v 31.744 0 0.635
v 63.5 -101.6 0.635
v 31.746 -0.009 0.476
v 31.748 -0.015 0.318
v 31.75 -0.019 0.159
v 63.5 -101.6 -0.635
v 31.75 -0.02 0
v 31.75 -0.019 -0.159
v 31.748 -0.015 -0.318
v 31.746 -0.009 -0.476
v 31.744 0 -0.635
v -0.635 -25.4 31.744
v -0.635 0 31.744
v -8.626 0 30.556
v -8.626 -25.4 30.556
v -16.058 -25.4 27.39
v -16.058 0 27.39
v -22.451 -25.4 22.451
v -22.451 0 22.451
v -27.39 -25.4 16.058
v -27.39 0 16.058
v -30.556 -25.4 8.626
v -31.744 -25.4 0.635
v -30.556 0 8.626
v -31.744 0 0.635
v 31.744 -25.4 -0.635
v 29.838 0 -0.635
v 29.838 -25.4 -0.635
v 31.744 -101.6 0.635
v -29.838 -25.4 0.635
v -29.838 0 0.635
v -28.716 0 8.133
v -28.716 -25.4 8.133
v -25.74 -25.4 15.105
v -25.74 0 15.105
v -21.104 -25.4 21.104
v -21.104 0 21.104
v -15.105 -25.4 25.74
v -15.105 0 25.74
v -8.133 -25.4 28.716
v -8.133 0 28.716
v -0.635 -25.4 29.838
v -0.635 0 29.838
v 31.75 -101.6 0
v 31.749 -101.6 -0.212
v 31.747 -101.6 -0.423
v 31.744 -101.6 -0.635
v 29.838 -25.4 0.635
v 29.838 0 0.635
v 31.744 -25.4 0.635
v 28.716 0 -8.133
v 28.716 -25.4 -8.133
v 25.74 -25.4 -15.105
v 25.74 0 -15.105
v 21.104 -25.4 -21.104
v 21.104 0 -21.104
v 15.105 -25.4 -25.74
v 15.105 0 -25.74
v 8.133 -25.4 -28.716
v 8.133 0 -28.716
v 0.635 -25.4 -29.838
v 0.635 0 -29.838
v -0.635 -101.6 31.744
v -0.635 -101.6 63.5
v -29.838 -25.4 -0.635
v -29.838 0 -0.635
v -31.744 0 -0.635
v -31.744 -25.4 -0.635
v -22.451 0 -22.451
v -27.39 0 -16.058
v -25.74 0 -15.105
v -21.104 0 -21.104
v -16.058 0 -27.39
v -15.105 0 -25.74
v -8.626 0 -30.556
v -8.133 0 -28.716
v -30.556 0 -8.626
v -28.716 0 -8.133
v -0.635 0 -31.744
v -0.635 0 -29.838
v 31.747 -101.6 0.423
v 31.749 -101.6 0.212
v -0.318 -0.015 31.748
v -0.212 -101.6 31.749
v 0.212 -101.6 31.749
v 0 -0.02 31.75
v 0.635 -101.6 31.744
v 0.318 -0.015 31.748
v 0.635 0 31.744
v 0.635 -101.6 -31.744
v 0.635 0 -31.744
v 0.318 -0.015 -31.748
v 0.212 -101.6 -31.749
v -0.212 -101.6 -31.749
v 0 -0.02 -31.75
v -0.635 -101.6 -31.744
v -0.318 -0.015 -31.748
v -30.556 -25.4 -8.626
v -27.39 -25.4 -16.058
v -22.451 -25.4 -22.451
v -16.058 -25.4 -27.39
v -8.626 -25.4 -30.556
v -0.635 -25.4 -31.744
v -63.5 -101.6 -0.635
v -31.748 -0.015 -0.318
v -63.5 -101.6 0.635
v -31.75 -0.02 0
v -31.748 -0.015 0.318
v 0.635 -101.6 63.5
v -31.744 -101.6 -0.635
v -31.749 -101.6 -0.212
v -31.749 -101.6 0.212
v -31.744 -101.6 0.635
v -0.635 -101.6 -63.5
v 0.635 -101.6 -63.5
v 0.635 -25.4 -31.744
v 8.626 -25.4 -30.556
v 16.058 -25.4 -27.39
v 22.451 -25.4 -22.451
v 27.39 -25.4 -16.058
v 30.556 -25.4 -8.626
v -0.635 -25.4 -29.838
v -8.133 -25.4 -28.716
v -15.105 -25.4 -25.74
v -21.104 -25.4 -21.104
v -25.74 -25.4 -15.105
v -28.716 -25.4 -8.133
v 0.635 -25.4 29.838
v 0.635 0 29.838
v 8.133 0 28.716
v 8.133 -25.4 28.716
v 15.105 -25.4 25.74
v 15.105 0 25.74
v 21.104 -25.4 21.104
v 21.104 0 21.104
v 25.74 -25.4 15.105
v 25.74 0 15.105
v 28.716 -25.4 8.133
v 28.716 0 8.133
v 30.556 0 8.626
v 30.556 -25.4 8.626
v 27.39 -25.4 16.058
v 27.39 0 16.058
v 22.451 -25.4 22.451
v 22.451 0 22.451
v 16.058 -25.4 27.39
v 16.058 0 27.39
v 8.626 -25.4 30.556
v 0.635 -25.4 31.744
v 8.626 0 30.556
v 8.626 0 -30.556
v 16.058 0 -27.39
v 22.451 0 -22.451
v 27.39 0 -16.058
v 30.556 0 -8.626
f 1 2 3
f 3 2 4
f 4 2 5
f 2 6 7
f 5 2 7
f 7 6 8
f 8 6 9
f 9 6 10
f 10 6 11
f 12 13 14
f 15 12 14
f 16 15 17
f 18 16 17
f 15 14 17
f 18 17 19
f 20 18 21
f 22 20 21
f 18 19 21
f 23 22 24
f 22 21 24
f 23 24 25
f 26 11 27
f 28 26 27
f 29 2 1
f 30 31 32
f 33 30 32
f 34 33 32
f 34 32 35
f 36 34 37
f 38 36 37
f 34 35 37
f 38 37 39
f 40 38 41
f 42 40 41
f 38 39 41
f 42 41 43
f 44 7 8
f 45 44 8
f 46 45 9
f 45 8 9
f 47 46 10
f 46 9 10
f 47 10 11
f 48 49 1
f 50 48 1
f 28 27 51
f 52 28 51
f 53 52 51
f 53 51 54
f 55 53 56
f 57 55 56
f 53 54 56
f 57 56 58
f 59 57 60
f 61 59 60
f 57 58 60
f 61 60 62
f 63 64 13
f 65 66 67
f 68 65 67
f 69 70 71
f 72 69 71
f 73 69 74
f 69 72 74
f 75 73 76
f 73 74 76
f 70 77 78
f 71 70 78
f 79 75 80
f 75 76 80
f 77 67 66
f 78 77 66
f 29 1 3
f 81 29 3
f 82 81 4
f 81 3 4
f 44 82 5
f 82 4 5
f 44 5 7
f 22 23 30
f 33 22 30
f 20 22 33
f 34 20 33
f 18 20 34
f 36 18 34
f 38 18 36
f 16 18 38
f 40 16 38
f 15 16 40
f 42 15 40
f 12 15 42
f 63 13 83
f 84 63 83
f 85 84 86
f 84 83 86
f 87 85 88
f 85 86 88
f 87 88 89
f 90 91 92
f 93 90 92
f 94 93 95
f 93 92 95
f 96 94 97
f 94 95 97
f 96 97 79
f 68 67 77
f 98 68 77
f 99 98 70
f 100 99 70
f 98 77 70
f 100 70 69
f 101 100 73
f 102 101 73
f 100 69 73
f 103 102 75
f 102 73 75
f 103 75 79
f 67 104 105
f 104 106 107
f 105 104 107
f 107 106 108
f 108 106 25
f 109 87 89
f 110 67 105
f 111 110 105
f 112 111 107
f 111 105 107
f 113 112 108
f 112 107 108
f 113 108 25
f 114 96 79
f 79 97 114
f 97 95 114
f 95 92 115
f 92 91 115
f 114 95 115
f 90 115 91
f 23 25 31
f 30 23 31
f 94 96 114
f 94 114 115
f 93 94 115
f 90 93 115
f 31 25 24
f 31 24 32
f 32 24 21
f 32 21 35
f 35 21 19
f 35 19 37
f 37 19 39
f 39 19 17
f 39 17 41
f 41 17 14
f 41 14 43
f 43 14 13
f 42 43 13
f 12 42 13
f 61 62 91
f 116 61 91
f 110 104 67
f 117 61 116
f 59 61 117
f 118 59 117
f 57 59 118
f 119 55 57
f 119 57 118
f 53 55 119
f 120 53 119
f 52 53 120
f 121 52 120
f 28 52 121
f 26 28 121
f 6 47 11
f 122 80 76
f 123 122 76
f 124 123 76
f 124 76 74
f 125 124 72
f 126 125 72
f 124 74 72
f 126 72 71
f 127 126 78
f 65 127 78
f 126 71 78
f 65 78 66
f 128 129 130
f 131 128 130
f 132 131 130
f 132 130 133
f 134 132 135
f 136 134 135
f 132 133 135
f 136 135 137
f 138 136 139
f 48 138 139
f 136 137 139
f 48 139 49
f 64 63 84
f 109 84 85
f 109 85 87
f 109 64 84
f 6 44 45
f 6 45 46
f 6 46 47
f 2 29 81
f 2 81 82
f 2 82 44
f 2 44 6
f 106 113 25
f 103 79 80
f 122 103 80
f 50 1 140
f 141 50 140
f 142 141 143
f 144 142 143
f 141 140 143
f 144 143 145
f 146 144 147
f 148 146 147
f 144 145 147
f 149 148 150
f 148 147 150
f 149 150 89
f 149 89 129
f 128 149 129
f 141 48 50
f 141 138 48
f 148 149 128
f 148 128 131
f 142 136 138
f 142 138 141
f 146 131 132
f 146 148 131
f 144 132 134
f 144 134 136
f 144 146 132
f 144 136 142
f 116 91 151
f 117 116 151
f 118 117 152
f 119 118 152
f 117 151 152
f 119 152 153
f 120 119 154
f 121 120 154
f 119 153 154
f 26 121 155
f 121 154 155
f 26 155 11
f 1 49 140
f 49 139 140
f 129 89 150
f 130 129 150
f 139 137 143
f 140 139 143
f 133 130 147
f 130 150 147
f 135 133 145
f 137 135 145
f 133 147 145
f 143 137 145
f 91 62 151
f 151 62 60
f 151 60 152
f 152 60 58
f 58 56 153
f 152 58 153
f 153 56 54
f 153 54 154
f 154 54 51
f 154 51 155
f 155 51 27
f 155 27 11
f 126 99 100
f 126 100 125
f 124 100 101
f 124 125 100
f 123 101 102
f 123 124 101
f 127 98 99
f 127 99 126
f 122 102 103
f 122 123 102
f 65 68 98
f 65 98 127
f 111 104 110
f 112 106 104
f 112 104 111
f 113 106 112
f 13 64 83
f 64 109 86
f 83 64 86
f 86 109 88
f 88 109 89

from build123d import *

# Parameters (mm, degrees)
F1_DEPTH  = 25.4
F2_DEPTH  = 101.6
F4_DEPTH  = 25.4
F6_DEPTH  = 25.4
F8_DEPTH  = 25.4
F10_DEPTH = 25.4


with BuildPart() as f1:
    # F0 (on Front) → F1 (new body)
    with BuildSketch(Plane.XZ):
        with BuildLine():
            Line((29.8382439162, 0.635), (31.7436493649, 0.635))
            ThreePointArc((31.7436493649, 0.635), (22.4506403027, 22.4506403027), (0.635, 31.7436493649))
            Line((0.635, 31.7436493649), (0.635, 29.8382439162))
            ThreePointArc((0.635, 29.8382439162), (21.1036018845, 21.1036018845), (29.8382439162, 0.635))
        make_face()
    extrude(amount=F1_DEPTH)


with BuildPart() as f1b:
    # F0 (on Front) → F1, piece 2 (new body)
    with BuildSketch(Plane.XZ):
        with BuildLine():
            Line((-0.635, 29.8382439162), (-0.635, 31.7436493649))
            ThreePointArc((-0.635, 31.7436493649), (-22.4506403027, 22.4506403027), (-31.7436493649, 0.635))
            Line((-31.7436493649, 0.635), (-29.8382439162, 0.635))
            ThreePointArc((-29.8382439162, 0.635), (-21.1036018845, 21.1036018845), (-0.635, 29.8382439162))
        make_face()
    extrude(amount=F1_DEPTH)


with BuildPart() as f1c:
    # F0 (on Front) → F1, piece 3 (new body)
    with BuildSketch(Plane.XZ):
        with BuildLine():
            ThreePointArc((-31.7436493649, -0.635), (-22.4506403027, -22.4506403027), (-0.635, -31.7436493649))
            Line((-0.635, -31.7436493649), (-0.635, -29.8382439162))
            ThreePointArc((-0.635, -29.8382439162), (-21.1036018845, -21.1036018845), (-29.8382439162, -0.635))
            Line((-29.8382439162, -0.635), (-31.7436493649, -0.635))
        make_face()
    extrude(amount=F1_DEPTH)


with BuildPart() as f1d:
    # F0 (on Front) → F1, piece 4 (new body)
    with BuildSketch(Plane.XZ):
        with BuildLine():
            ThreePointArc((0.635, -31.7436493649), (22.4506403027, -22.4506403027), (31.7436493649, -0.635))
            Line((31.7436493649, -0.635), (29.8382439162, -0.635))
            ThreePointArc((29.8382439162, -0.635), (21.1036018845, -21.1036018845), (0.635, -29.8382439162))
            Line((0.635, -29.8382439162), (0.635, -31.7436493649))
        make_face()
    extrude(amount=F1_DEPTH)


with BuildPart() as f2:
    # F0 (on Front) → F2 (new body)
    with BuildSketch(Plane.XZ):
        with BuildLine():
            ThreePointArc((-31.7436493649, -0.635), (-31.75, 0), (-31.7436493649, 0.635))
            Line((-31.7436493649, 0.635), (-63.5, 0.635))
            Line((-63.5, 0.635), (-63.5, -0.635))
            Line((-63.5, -0.635), (-31.7436493649, -0.635))
        make_face()
    extrude(amount=F2_DEPTH)

    # F7 (on face) → F8 (cut)
    with BuildSketch(Plane.XY.offset(0.635)):
        Polygon((-63.5, -101.6), (-31.7436493649, 0), (-63.5, 0), align=None)
    extrude(amount=-F8_DEPTH, mode=Mode.SUBTRACT)


with BuildPart() as f2b:
    # F0 (on Front) → F2, piece 2 (new body)
    with BuildSketch(Plane.XZ):
        with BuildLine():
            ThreePointArc((-0.635, 31.7436493649), (0, 31.75), (0.635, 31.7436493649))
            Line((0.635, 31.7436493649), (0.635, 63.5))
            Line((0.635, 63.5), (-0.635, 63.5))
            Line((-0.635, 63.5), (-0.635, 31.7436493649))
        make_face()
    extrude(amount=F2_DEPTH)

    # F3 (on face) → F4 (cut)
    with BuildSketch(Plane.YZ.offset(0.635)):
        Polygon((-101.6, 63.5), (0, 31.7436493649), (0, 63.5), align=None)
    extrude(amount=-F4_DEPTH, mode=Mode.SUBTRACT)


with BuildPart() as f2c:
    # F0 (on Front) → F2, piece 3 (new body)
    with BuildSketch(Plane.XZ):
        with BuildLine():
            ThreePointArc((31.7436493649, 0.635), (31.7484123015, 0.3175158778), (31.75, 0))
            ThreePointArc((31.75, 0), (31.7484123015, -0.3175158778), (31.7436493649, -0.635))
            Line((31.7436493649, -0.635), (63.5, -0.635))
            Line((63.5, -0.635), (63.5, 0.635))
            Line((63.5, 0.635), (31.7436493649, 0.635))
        make_face()
    extrude(amount=F2_DEPTH)

    # F5 (on face) → F6 (cut)
    with BuildSketch(Plane(origin=(0, 0, -0.635), x_dir=(1, 0, 0), z_dir=(0, 0, -1))):
        Polygon((63.5, 101.6), (31.7436493649, 0), (63.5, 0), align=None)
    extrude(amount=-F6_DEPTH, mode=Mode.SUBTRACT)


with BuildPart() as f2d:
    # F0 (on Front) → F2, piece 4 (new body)
    with BuildSketch(Plane.XZ):
        with BuildLine():
            Line((0.635, -63.5), (0.635, -31.7436493649))
            ThreePointArc((0.635, -31.7436493649), (0, -31.75), (-0.635, -31.7436493649))
            Line((-0.635, -31.7436493649), (-0.635, -63.5))
            Line((-0.635, -63.5), (0.635, -63.5))
        make_face()
    extrude(amount=F2_DEPTH)

    # F9 (on face) → F10 (cut)
    with BuildSketch(Plane.YZ.offset(0.635)):
        Polygon((0, -63.5), (0, -31.7436493649), (-101.6, -63.5), align=None)
    extrude(amount=-F10_DEPTH, mode=Mode.SUBTRACT)


solid = Compound([f1.part, f1b.part, f1c.part, f1d.part, f2.part, f2b.part, f2c.part, f2d.part])
